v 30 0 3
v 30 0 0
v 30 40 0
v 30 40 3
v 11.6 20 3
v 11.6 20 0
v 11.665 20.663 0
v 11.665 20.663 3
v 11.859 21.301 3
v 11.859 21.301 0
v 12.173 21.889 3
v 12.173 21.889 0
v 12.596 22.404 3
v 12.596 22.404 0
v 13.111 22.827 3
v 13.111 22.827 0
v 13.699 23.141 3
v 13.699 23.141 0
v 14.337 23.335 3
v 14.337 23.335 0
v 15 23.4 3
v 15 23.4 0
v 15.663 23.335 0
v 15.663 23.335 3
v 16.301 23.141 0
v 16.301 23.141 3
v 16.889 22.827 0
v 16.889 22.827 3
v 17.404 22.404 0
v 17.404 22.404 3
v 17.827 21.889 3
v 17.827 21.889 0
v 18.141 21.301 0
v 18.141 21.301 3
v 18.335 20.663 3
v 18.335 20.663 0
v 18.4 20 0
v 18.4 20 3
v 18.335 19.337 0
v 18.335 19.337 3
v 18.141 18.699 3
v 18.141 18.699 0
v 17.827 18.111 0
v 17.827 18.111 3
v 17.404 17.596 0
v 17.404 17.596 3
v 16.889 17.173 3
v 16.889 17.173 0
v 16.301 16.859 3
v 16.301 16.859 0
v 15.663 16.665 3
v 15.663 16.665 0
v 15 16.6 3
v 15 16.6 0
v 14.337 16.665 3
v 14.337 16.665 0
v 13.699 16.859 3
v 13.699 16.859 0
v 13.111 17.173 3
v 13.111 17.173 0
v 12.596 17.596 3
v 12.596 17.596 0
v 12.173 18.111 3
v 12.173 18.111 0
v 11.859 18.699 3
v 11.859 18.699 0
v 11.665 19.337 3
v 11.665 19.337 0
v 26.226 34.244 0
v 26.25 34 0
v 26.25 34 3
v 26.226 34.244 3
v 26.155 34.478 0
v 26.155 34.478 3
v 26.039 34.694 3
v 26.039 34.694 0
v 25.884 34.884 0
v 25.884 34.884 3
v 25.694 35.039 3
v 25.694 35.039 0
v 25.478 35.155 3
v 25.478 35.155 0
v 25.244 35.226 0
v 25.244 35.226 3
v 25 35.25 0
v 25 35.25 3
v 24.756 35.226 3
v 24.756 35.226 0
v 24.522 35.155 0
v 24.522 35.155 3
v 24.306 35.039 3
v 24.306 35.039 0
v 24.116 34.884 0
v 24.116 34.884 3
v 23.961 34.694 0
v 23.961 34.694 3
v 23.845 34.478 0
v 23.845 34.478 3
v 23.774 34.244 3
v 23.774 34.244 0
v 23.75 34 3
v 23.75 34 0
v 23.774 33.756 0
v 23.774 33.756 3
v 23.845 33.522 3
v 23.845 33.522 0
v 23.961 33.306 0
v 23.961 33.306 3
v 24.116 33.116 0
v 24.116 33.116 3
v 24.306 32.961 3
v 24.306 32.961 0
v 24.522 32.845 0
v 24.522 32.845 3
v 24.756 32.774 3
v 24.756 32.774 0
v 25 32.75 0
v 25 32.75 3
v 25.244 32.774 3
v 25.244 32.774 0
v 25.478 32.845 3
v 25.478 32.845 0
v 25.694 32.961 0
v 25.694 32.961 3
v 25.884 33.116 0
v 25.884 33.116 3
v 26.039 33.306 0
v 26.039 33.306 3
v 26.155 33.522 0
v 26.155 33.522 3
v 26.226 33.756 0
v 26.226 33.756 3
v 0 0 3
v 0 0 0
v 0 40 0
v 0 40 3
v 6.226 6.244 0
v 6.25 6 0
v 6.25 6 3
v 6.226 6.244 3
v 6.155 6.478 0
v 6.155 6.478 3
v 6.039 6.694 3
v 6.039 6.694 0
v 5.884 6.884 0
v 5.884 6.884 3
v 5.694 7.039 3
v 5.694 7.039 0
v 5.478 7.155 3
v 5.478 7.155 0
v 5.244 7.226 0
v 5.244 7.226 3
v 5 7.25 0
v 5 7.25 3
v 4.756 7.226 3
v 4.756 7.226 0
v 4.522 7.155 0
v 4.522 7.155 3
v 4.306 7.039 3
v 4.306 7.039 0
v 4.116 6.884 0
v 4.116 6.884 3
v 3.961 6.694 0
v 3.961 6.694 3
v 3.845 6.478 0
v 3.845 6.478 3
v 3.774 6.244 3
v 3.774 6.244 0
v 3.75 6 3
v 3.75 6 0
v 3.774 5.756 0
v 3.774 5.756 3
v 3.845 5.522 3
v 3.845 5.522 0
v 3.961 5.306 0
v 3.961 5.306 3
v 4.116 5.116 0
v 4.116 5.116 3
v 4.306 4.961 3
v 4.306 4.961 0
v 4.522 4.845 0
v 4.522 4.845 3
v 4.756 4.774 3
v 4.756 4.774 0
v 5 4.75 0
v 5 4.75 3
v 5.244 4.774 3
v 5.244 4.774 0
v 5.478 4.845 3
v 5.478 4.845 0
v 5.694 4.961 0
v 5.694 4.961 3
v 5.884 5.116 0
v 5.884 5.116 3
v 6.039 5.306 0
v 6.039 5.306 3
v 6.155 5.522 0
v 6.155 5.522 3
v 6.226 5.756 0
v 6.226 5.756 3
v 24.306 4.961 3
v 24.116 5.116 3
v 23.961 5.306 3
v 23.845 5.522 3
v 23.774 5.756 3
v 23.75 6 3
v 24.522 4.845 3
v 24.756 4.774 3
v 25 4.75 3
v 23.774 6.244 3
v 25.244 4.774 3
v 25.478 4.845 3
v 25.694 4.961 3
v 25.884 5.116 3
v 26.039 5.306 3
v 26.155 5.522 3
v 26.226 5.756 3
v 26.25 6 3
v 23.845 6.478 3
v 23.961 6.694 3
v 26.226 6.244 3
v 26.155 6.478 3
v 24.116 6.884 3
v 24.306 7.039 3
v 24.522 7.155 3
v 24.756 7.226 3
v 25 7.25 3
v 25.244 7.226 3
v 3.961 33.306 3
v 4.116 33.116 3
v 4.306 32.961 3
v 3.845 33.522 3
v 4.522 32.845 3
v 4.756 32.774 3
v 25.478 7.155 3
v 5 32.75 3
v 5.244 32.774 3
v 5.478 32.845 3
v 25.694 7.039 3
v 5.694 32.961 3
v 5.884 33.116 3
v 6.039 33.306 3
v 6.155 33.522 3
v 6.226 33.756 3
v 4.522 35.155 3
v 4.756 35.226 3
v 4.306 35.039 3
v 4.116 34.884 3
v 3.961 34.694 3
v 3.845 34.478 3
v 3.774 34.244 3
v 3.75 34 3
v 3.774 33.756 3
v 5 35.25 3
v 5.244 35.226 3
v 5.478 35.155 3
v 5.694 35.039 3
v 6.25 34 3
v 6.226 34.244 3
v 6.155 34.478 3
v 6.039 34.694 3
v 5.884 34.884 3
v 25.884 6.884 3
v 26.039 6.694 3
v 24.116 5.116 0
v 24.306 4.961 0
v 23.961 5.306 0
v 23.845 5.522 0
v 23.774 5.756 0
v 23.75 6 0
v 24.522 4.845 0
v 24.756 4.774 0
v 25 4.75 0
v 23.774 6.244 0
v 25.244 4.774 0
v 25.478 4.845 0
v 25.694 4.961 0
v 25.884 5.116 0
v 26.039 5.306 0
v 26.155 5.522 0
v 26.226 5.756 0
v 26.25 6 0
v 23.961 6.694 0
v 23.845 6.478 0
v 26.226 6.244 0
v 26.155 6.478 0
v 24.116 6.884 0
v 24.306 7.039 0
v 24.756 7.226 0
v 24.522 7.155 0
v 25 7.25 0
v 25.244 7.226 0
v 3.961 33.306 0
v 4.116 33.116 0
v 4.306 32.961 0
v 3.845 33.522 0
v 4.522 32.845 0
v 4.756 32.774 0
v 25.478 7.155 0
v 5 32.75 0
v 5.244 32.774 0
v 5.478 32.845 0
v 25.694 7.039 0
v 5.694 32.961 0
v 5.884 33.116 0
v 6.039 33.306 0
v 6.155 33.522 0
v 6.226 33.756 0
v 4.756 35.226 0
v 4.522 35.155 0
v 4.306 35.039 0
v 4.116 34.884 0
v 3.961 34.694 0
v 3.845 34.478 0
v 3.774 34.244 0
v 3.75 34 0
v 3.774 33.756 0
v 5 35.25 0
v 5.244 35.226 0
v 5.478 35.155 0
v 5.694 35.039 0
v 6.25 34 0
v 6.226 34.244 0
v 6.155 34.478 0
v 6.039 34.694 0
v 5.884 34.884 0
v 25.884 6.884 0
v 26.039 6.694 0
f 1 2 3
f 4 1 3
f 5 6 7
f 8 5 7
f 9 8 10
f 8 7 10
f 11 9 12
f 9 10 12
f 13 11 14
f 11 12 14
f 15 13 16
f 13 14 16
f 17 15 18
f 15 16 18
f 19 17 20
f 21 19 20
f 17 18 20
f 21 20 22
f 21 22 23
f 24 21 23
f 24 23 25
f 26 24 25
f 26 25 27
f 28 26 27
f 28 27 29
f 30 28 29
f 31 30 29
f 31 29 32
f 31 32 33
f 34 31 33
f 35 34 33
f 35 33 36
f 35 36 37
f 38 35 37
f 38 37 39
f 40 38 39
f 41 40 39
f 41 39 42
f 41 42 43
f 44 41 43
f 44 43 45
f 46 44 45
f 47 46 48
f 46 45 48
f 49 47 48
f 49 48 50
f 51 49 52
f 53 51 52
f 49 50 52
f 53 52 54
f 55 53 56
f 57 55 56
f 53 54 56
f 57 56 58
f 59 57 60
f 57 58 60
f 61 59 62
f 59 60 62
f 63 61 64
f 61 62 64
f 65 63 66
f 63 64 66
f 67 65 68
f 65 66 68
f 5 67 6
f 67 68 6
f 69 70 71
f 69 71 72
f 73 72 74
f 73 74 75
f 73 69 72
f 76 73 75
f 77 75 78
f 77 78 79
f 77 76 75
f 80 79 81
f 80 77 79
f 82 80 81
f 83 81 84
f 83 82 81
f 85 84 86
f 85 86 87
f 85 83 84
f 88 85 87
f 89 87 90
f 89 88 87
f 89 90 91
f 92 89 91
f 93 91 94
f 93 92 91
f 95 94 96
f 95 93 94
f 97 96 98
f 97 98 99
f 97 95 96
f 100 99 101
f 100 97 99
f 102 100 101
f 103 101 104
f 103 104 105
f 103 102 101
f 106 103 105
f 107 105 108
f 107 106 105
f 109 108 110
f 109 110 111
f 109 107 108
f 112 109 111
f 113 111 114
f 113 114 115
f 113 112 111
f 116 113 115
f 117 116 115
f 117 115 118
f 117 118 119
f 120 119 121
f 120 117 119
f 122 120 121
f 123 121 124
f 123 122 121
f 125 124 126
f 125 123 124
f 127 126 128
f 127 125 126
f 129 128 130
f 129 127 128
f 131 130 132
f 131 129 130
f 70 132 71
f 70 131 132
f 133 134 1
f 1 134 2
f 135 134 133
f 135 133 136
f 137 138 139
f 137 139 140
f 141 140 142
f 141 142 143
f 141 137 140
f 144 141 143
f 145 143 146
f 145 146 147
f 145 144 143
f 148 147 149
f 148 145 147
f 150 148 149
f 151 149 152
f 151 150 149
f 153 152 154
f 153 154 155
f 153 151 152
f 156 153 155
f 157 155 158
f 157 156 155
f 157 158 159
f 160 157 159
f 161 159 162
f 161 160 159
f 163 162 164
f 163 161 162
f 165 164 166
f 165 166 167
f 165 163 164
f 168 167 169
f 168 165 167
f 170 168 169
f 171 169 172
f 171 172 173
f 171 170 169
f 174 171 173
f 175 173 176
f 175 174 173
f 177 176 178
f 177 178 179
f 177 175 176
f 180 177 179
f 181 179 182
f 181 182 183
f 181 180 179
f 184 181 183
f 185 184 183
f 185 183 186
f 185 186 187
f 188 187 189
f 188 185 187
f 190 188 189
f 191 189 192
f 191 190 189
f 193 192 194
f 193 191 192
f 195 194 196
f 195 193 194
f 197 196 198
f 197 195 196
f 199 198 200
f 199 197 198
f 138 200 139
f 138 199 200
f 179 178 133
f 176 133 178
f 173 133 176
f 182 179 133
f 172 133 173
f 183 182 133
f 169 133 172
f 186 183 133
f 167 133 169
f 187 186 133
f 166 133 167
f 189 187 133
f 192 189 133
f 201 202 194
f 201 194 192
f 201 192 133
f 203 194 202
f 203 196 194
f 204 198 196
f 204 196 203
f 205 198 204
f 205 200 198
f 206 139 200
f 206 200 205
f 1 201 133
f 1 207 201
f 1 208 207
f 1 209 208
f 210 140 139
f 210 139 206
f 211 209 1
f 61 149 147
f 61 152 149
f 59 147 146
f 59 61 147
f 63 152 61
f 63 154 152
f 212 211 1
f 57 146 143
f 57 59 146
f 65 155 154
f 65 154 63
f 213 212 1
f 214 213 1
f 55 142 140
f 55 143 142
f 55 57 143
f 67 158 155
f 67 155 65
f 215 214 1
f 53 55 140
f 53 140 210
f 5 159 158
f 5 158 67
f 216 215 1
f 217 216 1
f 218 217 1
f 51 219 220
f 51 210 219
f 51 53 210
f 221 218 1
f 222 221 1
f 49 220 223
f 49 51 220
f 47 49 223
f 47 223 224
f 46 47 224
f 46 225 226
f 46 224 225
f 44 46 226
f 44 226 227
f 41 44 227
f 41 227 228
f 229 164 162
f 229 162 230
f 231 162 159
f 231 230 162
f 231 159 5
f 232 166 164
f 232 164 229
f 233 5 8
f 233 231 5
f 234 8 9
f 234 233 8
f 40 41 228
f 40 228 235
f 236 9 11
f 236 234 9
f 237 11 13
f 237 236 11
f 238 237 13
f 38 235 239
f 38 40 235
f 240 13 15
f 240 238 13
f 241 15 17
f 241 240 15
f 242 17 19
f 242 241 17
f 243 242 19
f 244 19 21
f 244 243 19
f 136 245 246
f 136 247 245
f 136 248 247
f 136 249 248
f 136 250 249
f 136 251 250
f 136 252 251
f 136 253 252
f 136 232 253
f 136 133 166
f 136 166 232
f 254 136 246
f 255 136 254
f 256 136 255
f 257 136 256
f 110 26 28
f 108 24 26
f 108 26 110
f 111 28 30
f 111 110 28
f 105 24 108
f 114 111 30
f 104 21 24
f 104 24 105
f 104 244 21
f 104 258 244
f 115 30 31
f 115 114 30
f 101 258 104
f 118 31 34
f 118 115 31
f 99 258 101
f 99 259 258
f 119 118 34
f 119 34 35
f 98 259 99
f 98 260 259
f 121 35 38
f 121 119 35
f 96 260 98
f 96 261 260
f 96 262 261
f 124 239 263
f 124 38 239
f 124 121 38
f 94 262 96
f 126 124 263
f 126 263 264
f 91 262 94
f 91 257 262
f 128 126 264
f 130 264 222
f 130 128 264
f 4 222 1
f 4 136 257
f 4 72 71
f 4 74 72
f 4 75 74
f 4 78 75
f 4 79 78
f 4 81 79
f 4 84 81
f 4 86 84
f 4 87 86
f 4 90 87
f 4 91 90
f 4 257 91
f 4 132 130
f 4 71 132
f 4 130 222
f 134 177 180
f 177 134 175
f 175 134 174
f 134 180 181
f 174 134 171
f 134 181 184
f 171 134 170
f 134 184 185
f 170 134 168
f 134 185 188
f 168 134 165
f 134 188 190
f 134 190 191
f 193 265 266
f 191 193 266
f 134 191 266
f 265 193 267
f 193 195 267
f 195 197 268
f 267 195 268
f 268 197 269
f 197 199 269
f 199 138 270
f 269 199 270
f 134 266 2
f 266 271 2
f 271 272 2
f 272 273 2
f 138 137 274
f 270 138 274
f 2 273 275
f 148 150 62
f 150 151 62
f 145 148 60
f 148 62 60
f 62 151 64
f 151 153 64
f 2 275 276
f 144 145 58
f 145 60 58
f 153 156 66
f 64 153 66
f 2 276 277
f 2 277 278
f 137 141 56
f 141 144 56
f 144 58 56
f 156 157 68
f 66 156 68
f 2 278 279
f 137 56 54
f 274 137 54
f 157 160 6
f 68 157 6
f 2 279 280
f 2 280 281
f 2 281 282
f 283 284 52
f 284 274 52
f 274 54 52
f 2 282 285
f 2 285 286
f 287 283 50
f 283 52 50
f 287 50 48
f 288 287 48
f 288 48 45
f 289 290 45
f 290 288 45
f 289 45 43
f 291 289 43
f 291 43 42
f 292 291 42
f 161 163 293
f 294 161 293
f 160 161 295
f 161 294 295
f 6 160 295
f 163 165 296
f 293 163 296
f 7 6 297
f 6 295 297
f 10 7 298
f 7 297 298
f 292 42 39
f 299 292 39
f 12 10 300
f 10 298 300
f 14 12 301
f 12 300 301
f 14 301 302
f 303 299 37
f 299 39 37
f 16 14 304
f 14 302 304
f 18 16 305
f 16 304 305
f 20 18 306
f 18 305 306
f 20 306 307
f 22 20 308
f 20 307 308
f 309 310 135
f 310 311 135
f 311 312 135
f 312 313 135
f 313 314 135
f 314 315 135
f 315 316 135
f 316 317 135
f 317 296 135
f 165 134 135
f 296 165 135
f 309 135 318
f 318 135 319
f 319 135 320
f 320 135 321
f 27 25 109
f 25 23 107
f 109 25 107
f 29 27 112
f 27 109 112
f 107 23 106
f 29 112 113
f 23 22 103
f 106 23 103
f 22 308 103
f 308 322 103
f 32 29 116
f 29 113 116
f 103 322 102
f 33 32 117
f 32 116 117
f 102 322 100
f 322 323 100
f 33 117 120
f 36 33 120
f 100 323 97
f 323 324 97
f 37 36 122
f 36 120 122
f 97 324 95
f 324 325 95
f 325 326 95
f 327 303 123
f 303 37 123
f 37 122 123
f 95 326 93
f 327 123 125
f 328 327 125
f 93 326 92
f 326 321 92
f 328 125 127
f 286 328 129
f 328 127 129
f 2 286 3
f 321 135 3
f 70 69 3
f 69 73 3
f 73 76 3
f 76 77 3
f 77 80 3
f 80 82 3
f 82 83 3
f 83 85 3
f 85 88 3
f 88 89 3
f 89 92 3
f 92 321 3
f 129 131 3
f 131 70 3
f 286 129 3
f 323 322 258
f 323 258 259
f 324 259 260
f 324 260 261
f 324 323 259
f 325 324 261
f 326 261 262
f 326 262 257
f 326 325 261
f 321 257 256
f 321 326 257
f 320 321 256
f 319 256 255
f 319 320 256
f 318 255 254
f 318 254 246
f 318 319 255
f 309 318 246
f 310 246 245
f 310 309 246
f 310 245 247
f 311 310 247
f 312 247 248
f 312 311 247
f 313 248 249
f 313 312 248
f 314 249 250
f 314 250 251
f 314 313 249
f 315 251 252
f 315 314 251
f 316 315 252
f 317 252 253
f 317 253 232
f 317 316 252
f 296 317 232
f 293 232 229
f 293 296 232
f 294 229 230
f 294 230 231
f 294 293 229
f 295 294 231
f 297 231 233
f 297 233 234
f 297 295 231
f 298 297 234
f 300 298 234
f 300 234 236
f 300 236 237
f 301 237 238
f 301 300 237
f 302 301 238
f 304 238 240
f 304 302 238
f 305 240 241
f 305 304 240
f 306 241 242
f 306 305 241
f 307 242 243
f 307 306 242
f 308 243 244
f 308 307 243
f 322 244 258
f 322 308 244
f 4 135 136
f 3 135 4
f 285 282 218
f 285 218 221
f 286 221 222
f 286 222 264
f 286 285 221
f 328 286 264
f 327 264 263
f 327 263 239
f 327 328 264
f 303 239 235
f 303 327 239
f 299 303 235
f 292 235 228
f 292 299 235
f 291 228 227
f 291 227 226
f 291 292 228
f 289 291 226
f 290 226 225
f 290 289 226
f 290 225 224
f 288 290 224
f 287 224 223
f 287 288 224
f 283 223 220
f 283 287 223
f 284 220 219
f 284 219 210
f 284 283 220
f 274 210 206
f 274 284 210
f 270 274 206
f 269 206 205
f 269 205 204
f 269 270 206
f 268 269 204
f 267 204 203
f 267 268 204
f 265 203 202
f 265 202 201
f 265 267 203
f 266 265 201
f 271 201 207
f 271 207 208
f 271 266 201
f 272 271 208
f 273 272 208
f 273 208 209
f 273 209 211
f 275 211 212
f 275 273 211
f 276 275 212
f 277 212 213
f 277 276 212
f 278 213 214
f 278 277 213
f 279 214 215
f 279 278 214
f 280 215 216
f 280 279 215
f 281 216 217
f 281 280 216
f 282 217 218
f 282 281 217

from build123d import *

# Parameters (mm, degrees)
SKETCH1_W                       = 30
SKETCH1_H                       = 40
BOSS_EXTRUDE1_DEPTH             = 3
TAP_DRILL_FOR_M3_TAP1_OUTLINE_R = 1.25
TAP_DRILL_FOR_M3_TAP1_DEPTH     = 3
TAP_DRILL_FOR_M8_TAP1_D         = 6.8
TAP_DRILL_FOR_M8_TAP1_DEPTH     = 3


# Read off the part's stored shape, not the designer's step: Tap Drill for M3 Tap1
with BuildPart() as part:
    # Sketch1 → Boss-Extrude1 (new body)
    with BuildSketch(Plane.XY):
        with Locations((15, 20)):
            Rectangle(SKETCH1_W, SKETCH1_H)
    extrude(amount=BOSS_EXTRUDE1_DEPTH)

    # Tap Drill for M3 Tap1 outline → Tap Drill for M3 Tap1 (cut)
    with BuildSketch(Plane.XY):
        with Locations((25, 6)):
            Circle(TAP_DRILL_FOR_M3_TAP1_OUTLINE_R)
        with Locations((5, 34)):
            Circle(TAP_DRILL_FOR_M3_TAP1_OUTLINE_R)
        with Locations((5, 6)):
            Circle(TAP_DRILL_FOR_M3_TAP1_OUTLINE_R)
        with Locations((25, 34)):
            Circle(TAP_DRILL_FOR_M3_TAP1_OUTLINE_R)
        with Locations((15, 20)):
            Circle(TAP_DRILL_FOR_M3_TAP1_OUTLINE_R)
    extrude(amount=TAP_DRILL_FOR_M3_TAP1_DEPTH, mode=Mode.SUBTRACT)

    # Tap Drill for M8 Tap1
    with Locations(Plane.XY.offset(3)):
        with Locations((15, 20)):
            Hole(TAP_DRILL_FOR_M8_TAP1_D / 2, depth=TAP_DRILL_FOR_M8_TAP1_DEPTH)


solid = part.part
